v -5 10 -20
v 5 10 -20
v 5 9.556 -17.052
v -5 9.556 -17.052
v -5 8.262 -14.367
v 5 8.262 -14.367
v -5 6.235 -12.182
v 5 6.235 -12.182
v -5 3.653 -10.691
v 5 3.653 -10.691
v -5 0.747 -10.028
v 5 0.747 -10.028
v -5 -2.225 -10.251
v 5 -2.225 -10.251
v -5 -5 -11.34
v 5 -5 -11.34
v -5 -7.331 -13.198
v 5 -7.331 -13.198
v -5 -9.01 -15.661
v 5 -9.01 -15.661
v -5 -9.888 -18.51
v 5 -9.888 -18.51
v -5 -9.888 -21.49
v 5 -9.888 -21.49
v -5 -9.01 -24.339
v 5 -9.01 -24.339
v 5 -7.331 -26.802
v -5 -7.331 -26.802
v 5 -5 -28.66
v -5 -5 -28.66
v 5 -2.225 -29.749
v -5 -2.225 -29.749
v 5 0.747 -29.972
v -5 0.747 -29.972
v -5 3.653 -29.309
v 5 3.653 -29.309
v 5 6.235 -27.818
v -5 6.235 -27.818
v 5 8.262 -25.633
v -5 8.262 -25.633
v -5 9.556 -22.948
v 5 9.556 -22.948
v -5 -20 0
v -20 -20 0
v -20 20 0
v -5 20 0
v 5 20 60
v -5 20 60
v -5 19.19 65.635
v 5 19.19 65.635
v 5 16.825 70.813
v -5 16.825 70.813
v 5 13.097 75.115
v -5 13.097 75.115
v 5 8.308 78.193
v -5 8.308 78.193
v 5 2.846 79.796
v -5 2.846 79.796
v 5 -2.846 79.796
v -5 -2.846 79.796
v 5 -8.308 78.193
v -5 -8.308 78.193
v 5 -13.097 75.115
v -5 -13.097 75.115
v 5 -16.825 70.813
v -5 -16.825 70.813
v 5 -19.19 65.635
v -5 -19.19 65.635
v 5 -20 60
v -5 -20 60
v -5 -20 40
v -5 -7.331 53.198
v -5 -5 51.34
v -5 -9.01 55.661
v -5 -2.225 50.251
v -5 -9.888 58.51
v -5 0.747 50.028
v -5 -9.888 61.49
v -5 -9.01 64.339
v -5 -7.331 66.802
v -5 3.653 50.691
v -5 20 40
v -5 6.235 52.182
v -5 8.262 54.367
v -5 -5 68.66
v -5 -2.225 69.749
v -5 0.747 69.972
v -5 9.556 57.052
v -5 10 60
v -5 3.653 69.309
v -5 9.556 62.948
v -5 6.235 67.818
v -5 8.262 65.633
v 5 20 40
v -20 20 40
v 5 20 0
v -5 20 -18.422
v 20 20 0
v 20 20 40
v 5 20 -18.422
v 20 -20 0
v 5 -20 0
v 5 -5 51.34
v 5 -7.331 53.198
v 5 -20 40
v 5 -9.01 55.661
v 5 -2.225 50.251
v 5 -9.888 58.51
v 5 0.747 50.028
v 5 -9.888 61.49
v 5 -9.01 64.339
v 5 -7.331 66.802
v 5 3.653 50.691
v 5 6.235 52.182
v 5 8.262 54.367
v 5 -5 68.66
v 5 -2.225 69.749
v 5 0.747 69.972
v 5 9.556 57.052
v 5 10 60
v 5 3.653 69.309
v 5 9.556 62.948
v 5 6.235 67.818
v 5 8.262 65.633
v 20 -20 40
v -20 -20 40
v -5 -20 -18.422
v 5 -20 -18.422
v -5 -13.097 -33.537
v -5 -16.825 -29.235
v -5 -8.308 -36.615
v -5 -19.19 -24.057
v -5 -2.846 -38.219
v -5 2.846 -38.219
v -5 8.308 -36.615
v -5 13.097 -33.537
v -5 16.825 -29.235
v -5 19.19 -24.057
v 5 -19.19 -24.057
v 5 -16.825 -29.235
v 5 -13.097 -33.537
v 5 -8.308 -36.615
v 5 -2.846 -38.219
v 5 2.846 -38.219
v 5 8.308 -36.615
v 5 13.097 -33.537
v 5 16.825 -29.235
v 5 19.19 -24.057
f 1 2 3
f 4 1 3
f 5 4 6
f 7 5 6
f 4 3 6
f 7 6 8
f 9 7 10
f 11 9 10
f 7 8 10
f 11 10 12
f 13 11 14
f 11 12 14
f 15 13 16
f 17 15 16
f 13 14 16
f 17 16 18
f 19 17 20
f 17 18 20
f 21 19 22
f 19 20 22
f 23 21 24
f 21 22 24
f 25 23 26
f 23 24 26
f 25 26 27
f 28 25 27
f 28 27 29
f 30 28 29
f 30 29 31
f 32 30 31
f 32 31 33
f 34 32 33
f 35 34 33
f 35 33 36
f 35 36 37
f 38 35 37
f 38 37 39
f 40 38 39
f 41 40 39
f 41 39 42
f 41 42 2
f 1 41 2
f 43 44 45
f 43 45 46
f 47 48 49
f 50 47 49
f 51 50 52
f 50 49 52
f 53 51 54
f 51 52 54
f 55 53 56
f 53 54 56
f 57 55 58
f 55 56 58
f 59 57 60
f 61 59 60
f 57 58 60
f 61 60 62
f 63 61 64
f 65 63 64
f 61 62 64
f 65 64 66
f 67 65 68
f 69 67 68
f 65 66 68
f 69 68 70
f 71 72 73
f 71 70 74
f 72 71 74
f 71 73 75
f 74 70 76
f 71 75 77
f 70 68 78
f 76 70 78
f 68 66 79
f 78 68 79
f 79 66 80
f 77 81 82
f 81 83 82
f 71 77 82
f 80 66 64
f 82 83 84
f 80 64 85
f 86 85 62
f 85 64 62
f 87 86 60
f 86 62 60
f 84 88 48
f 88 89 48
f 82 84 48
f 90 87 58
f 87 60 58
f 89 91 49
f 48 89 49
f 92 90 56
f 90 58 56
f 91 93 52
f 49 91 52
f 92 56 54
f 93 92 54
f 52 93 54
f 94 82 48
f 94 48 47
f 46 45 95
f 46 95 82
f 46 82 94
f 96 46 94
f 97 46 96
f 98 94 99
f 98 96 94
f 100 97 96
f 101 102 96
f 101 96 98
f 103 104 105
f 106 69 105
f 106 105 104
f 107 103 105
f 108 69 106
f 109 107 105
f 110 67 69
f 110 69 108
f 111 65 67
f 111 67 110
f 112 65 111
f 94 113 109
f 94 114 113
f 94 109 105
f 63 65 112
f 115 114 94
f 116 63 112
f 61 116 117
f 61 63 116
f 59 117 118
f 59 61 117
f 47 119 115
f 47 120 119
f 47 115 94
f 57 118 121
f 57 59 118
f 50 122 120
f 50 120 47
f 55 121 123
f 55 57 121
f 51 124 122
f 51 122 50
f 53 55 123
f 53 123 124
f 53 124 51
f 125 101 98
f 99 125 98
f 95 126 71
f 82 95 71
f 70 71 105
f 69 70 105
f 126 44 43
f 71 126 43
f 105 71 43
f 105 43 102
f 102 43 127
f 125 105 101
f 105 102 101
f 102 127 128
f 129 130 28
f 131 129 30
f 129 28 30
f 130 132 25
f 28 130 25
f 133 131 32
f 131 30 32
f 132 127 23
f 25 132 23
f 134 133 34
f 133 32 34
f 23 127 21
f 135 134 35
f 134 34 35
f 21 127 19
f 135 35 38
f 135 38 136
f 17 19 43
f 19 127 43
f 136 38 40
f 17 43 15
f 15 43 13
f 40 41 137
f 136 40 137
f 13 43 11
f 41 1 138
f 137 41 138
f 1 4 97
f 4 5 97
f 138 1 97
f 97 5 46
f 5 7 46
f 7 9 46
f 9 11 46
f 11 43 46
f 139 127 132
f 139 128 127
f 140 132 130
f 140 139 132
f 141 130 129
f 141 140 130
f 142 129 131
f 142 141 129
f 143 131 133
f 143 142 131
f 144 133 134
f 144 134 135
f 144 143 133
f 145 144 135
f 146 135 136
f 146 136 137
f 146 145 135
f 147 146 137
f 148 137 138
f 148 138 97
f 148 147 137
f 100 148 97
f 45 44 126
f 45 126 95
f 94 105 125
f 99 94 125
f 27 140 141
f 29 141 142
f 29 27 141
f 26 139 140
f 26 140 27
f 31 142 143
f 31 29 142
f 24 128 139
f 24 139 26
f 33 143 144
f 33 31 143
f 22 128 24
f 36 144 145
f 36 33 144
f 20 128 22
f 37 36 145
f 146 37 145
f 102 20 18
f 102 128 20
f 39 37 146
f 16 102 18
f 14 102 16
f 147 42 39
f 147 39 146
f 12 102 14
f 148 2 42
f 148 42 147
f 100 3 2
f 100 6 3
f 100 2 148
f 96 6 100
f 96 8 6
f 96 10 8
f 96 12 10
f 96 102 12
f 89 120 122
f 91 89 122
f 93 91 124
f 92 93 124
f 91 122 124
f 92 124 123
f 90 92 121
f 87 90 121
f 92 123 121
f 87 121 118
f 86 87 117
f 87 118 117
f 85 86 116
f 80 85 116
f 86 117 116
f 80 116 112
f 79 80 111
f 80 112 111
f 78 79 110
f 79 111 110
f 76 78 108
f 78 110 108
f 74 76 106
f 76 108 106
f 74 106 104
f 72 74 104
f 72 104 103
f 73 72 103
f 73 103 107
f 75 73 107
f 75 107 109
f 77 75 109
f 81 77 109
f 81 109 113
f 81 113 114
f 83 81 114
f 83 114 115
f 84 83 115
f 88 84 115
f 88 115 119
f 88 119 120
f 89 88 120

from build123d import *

# Parameters (mm, degrees)
F0_W     = 40
F0_H     = 40
F1_DEPTH = 40
F3_DEPTH = 5
F4_R     = 10
F5_DEPTH = 25


with BuildPart() as f1:
    # F0 (on Top) → F1 (new body)
    with BuildSketch(Plane.XY):
        Rectangle(F0_W, F0_H)
    extrude(amount=F1_DEPTH)

    # F2 (on Right) → F3 (join, symmetric)
    with BuildSketch(Plane.YZ):
        with BuildLine():
            Line((-20, 60), (-20, 40))
            Line((-20, 40), (20, 40))
            Line((20, 40), (20, 60))
            ThreePointArc((20, 60), (0, 80), (-20, 60))
        make_face()
        with BuildLine():
            Line((20, -18.422272), (20, 0))
            Line((20, 0), (-20, 0))
            Line((-20, 0), (-20, -18.422272))
            ThreePointArc((-20, -18.422272), (0, -38.422272), (20, -18.422272))
        make_face()
    extrude(amount=F3_DEPTH, both=True)

    # F4 (on face) → F5 (cut)
    with BuildSketch(Plane.YZ.offset(5)):
        with Locations((0, 60)):
            Circle(F4_R)
        with Locations((0, -20)):
            Circle(F4_R)
    extrude(amount=-F5_DEPTH, mode=Mode.SUBTRACT)


solid = f1.part
